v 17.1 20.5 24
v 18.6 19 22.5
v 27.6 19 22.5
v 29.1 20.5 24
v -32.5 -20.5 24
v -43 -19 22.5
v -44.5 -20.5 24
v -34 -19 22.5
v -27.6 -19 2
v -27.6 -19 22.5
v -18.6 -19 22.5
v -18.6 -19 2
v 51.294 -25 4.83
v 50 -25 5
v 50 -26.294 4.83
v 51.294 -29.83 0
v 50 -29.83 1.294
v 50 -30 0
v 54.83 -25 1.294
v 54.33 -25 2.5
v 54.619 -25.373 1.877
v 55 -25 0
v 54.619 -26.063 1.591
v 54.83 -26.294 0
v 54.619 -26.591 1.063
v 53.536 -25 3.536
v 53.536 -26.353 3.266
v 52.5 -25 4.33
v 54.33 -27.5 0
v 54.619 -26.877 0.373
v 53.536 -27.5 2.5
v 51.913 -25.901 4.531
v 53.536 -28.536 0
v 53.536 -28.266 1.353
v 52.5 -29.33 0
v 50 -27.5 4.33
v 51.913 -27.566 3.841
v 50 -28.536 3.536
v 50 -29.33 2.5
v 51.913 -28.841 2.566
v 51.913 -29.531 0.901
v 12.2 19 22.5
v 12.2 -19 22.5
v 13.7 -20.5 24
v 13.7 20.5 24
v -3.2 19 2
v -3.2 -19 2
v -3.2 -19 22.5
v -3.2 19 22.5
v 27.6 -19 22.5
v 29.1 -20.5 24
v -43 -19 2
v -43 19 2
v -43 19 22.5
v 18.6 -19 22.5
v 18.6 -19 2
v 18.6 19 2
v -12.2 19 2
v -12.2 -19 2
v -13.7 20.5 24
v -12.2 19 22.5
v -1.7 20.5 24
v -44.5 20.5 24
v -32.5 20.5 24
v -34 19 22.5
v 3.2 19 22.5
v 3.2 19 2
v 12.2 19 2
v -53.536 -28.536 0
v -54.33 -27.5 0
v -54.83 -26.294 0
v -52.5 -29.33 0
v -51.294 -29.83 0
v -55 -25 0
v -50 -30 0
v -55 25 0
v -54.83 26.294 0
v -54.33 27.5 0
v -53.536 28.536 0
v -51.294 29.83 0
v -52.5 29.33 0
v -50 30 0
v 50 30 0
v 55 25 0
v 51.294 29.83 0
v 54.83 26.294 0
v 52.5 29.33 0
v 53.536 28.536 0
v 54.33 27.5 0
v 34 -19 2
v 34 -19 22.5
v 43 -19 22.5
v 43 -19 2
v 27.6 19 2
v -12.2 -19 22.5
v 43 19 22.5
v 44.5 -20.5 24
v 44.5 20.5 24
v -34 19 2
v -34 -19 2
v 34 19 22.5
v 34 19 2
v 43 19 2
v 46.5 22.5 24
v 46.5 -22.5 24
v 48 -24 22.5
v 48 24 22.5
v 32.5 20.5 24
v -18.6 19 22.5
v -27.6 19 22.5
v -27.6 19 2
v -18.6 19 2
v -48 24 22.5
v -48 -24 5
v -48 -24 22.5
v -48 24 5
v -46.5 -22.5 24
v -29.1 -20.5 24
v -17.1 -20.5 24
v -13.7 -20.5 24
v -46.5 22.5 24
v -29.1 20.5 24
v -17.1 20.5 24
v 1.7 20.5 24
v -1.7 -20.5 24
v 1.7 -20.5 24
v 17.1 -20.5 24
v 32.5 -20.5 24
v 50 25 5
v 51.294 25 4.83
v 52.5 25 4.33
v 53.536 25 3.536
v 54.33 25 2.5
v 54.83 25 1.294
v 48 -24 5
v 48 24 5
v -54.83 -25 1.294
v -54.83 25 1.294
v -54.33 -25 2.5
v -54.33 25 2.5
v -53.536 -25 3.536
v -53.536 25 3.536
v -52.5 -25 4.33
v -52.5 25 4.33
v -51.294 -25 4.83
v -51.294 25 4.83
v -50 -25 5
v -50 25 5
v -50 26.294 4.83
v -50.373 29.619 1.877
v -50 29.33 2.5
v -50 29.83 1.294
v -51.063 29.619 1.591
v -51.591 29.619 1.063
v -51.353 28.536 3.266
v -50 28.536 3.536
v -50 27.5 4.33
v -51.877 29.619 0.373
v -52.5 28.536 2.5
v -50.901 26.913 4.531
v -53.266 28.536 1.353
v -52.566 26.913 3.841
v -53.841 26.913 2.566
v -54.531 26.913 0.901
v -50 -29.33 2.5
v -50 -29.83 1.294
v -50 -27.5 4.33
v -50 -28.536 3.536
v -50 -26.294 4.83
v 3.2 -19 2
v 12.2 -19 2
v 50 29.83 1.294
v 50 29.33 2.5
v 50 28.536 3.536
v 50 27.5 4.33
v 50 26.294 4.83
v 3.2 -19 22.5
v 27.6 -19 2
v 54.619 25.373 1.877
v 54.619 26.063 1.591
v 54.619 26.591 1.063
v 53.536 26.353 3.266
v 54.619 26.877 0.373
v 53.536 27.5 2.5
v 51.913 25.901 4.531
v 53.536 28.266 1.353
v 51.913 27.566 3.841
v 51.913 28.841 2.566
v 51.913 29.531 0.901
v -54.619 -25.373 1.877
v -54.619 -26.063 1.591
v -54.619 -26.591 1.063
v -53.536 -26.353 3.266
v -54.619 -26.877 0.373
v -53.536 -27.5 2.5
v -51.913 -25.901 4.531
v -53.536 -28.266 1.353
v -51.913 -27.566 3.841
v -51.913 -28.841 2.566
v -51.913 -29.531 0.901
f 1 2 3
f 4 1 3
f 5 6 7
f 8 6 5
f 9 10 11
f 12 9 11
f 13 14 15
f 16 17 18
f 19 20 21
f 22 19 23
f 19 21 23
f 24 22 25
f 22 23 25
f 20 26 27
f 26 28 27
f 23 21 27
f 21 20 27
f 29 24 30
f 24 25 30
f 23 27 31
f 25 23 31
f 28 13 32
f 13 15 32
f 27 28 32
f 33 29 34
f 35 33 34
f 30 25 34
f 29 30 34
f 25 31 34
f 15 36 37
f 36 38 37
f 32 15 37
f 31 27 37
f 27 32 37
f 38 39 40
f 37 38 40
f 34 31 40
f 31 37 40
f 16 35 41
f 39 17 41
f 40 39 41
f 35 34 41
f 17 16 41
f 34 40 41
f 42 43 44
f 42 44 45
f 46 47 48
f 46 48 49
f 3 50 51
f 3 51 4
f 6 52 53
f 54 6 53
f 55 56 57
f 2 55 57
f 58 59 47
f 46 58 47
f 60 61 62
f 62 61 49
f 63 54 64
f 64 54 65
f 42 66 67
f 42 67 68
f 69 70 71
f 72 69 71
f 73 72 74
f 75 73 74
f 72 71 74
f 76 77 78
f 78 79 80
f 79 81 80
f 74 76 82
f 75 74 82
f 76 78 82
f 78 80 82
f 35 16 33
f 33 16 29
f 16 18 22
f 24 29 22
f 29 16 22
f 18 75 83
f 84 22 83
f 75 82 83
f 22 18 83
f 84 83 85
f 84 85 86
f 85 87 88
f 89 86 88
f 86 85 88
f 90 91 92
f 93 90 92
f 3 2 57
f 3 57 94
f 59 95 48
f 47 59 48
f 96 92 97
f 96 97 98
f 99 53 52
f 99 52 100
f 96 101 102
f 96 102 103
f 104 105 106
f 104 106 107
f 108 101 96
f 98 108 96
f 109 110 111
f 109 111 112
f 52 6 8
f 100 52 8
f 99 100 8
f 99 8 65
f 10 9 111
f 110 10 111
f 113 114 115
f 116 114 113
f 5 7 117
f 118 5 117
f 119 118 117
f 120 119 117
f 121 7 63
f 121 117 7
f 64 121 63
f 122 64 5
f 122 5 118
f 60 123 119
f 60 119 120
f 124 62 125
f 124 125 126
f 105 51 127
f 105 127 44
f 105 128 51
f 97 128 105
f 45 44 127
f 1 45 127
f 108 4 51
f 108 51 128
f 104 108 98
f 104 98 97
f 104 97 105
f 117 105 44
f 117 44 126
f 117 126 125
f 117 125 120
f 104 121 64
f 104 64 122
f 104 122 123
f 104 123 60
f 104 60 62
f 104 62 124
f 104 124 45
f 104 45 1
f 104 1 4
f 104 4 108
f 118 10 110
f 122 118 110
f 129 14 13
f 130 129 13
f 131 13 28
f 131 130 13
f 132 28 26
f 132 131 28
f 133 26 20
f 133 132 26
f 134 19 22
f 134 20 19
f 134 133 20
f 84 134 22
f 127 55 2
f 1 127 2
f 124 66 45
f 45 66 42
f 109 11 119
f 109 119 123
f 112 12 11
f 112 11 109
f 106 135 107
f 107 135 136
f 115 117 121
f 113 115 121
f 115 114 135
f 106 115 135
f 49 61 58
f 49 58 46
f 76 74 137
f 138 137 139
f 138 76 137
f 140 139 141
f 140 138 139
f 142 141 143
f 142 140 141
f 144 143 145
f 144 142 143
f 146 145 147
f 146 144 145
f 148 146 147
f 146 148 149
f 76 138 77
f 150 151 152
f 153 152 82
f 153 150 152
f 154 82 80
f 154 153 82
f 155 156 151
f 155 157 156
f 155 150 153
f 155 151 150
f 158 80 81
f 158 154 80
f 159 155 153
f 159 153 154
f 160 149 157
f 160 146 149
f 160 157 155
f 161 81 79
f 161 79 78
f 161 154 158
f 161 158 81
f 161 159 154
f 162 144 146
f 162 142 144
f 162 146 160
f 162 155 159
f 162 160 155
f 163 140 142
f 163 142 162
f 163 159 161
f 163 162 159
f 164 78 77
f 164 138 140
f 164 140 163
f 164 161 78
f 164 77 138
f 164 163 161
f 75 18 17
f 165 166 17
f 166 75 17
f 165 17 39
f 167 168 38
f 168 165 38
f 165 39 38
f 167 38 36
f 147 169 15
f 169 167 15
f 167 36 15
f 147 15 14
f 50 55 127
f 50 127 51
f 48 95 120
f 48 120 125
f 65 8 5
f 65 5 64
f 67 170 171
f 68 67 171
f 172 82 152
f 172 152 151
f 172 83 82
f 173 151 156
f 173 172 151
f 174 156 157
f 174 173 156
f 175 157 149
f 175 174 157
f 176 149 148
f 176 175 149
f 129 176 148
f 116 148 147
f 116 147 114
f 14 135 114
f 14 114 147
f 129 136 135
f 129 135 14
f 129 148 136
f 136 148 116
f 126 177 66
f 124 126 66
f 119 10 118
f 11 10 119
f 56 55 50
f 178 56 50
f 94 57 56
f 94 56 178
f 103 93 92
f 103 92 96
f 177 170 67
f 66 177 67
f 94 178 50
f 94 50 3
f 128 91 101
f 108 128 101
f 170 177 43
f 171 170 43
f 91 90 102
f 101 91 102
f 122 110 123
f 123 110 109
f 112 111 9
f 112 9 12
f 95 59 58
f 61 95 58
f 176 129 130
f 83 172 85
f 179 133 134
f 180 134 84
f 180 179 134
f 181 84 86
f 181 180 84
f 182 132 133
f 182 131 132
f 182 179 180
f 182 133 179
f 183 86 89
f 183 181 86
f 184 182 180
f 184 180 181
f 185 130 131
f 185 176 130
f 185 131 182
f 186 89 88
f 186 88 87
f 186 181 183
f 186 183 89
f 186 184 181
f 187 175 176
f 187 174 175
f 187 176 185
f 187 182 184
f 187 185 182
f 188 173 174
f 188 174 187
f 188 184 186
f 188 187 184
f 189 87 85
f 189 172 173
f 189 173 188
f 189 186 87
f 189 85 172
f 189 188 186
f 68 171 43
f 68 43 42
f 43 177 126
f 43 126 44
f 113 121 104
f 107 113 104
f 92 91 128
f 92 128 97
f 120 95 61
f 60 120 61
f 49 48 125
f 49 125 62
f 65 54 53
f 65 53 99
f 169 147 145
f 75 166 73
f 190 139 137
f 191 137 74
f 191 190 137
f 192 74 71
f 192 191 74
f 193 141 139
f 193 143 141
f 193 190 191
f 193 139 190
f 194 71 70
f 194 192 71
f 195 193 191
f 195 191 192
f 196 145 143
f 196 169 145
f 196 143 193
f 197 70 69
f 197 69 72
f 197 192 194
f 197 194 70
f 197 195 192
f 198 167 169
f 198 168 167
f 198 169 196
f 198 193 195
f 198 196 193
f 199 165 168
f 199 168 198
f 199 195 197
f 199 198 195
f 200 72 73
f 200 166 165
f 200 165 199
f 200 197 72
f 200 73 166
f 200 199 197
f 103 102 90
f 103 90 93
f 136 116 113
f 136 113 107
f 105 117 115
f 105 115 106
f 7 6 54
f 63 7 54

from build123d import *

# Parameters (mm, degrees)
F0_W     = 96
F0_H     = 48
F1_DEPTH = 2
F2_W     = 96
F2_H     = 48
F2_W_2   = 9
F2_H_2   = 38
F3_DEPTH = 22
F0_W_2   = 110
F0_H_2   = 60
F4_DEPTH = 5
F5_R     = 4.99999
F6_SIZE  = 1.5


# Not quite as in the source:
# - a fillet or chamfer is up to 0.001 mm smaller than in the source, because OpenCascade refuses the exact size
# - a feature names something its author has since deleted; it is built from what else it names


with BuildPart() as f1:
    # F0 (on Top) → F1 (new body)
    with BuildSketch(Plane.XY):
        Rectangle(F0_W, F0_H)
    extrude(amount=F1_DEPTH)

    # F2 (on face) → F3 (join)
    with BuildSketch(Plane.XY.offset(2)):
        Rectangle(F2_W, F2_H)
        with Locations((-38.5, 0)):
            Rectangle(F2_W_2, F2_H_2, mode=Mode.SUBTRACT)
        with Locations((-23.1, 0)):
            Rectangle(F2_W_2, F2_H_2, mode=Mode.SUBTRACT)
        with Locations((-7.7, 0)):
            Rectangle(F2_W_2, F2_H_2, mode=Mode.SUBTRACT)
        with Locations((7.7, 0)):
            Rectangle(F2_W_2, F2_H_2, mode=Mode.SUBTRACT)
        with Locations((23.1, 0)):
            Rectangle(F2_W_2, F2_H_2, mode=Mode.SUBTRACT)
        with Locations((38.5, 0)):
            Rectangle(F2_W_2, F2_H_2, mode=Mode.SUBTRACT)
    extrude(amount=F3_DEPTH)

    # F0 (on Top) → F4 (join)
    with BuildSketch(Plane.XY):
        Rectangle(F0_W_2, F0_H_2)
        Rectangle(F0_W, F0_H, mode=Mode.SUBTRACT)
    extrude(amount=F4_DEPTH)

    # F5 (radius 5 in the source; OpenCascade refuses exactly that, so slightly less here)
    f5_edges = [f1.edges().sort_by_distance(p)[0] for p in [
        (0, -30, 5),
        (-55, 0, 5),
        (0, 30, 5),
        (55, 0, 5),
        (55, -30, 2.5),
        (55, 30, 2.5),
        (-55, -30, 2.5),
        (-55, 30, 2.5),
    ]]
    fillet(f5_edges, radius=F5_R)

    # F6
    f6_edges = [f1.edges().sort_by_distance(p)[0] for p in [
        (0, -24, 24),
        (-48, 0, 24),
        (0, 24, 24),
        (48, 0, 24),
        (-43, 0, 24),
        (-34, 0, 24),
        (-38.5, -19, 24),
        (-38.5, 19, 24),
        (-23.1, -19, 24),
        (-18.6, 0, 24),
        (-27.6, 0, 24),
        (-23.1, 19, 24),
        (-7.7, 19, 24),
        (-12.2, 0, 24),
        (-7.7, -19, 24),
        (-3.2, 0, 24),
        (3.2, 0, 24),
        (12.2, 0, 24),
        (7.7, -19, 24),
        (7.7, 19, 24),
        (18.6, 0, 24),
        (23.1, 19, 24),
        (27.6, 0, 24),
        (23.1, -19, 24),
        (38.5, -19, 24),
        (34, 0, 24),
        (43, 0, 24),
        (38.5, 19, 24),
    ]]
    chamfer(f6_edges, length=F6_SIZE)


solid = f1.part
